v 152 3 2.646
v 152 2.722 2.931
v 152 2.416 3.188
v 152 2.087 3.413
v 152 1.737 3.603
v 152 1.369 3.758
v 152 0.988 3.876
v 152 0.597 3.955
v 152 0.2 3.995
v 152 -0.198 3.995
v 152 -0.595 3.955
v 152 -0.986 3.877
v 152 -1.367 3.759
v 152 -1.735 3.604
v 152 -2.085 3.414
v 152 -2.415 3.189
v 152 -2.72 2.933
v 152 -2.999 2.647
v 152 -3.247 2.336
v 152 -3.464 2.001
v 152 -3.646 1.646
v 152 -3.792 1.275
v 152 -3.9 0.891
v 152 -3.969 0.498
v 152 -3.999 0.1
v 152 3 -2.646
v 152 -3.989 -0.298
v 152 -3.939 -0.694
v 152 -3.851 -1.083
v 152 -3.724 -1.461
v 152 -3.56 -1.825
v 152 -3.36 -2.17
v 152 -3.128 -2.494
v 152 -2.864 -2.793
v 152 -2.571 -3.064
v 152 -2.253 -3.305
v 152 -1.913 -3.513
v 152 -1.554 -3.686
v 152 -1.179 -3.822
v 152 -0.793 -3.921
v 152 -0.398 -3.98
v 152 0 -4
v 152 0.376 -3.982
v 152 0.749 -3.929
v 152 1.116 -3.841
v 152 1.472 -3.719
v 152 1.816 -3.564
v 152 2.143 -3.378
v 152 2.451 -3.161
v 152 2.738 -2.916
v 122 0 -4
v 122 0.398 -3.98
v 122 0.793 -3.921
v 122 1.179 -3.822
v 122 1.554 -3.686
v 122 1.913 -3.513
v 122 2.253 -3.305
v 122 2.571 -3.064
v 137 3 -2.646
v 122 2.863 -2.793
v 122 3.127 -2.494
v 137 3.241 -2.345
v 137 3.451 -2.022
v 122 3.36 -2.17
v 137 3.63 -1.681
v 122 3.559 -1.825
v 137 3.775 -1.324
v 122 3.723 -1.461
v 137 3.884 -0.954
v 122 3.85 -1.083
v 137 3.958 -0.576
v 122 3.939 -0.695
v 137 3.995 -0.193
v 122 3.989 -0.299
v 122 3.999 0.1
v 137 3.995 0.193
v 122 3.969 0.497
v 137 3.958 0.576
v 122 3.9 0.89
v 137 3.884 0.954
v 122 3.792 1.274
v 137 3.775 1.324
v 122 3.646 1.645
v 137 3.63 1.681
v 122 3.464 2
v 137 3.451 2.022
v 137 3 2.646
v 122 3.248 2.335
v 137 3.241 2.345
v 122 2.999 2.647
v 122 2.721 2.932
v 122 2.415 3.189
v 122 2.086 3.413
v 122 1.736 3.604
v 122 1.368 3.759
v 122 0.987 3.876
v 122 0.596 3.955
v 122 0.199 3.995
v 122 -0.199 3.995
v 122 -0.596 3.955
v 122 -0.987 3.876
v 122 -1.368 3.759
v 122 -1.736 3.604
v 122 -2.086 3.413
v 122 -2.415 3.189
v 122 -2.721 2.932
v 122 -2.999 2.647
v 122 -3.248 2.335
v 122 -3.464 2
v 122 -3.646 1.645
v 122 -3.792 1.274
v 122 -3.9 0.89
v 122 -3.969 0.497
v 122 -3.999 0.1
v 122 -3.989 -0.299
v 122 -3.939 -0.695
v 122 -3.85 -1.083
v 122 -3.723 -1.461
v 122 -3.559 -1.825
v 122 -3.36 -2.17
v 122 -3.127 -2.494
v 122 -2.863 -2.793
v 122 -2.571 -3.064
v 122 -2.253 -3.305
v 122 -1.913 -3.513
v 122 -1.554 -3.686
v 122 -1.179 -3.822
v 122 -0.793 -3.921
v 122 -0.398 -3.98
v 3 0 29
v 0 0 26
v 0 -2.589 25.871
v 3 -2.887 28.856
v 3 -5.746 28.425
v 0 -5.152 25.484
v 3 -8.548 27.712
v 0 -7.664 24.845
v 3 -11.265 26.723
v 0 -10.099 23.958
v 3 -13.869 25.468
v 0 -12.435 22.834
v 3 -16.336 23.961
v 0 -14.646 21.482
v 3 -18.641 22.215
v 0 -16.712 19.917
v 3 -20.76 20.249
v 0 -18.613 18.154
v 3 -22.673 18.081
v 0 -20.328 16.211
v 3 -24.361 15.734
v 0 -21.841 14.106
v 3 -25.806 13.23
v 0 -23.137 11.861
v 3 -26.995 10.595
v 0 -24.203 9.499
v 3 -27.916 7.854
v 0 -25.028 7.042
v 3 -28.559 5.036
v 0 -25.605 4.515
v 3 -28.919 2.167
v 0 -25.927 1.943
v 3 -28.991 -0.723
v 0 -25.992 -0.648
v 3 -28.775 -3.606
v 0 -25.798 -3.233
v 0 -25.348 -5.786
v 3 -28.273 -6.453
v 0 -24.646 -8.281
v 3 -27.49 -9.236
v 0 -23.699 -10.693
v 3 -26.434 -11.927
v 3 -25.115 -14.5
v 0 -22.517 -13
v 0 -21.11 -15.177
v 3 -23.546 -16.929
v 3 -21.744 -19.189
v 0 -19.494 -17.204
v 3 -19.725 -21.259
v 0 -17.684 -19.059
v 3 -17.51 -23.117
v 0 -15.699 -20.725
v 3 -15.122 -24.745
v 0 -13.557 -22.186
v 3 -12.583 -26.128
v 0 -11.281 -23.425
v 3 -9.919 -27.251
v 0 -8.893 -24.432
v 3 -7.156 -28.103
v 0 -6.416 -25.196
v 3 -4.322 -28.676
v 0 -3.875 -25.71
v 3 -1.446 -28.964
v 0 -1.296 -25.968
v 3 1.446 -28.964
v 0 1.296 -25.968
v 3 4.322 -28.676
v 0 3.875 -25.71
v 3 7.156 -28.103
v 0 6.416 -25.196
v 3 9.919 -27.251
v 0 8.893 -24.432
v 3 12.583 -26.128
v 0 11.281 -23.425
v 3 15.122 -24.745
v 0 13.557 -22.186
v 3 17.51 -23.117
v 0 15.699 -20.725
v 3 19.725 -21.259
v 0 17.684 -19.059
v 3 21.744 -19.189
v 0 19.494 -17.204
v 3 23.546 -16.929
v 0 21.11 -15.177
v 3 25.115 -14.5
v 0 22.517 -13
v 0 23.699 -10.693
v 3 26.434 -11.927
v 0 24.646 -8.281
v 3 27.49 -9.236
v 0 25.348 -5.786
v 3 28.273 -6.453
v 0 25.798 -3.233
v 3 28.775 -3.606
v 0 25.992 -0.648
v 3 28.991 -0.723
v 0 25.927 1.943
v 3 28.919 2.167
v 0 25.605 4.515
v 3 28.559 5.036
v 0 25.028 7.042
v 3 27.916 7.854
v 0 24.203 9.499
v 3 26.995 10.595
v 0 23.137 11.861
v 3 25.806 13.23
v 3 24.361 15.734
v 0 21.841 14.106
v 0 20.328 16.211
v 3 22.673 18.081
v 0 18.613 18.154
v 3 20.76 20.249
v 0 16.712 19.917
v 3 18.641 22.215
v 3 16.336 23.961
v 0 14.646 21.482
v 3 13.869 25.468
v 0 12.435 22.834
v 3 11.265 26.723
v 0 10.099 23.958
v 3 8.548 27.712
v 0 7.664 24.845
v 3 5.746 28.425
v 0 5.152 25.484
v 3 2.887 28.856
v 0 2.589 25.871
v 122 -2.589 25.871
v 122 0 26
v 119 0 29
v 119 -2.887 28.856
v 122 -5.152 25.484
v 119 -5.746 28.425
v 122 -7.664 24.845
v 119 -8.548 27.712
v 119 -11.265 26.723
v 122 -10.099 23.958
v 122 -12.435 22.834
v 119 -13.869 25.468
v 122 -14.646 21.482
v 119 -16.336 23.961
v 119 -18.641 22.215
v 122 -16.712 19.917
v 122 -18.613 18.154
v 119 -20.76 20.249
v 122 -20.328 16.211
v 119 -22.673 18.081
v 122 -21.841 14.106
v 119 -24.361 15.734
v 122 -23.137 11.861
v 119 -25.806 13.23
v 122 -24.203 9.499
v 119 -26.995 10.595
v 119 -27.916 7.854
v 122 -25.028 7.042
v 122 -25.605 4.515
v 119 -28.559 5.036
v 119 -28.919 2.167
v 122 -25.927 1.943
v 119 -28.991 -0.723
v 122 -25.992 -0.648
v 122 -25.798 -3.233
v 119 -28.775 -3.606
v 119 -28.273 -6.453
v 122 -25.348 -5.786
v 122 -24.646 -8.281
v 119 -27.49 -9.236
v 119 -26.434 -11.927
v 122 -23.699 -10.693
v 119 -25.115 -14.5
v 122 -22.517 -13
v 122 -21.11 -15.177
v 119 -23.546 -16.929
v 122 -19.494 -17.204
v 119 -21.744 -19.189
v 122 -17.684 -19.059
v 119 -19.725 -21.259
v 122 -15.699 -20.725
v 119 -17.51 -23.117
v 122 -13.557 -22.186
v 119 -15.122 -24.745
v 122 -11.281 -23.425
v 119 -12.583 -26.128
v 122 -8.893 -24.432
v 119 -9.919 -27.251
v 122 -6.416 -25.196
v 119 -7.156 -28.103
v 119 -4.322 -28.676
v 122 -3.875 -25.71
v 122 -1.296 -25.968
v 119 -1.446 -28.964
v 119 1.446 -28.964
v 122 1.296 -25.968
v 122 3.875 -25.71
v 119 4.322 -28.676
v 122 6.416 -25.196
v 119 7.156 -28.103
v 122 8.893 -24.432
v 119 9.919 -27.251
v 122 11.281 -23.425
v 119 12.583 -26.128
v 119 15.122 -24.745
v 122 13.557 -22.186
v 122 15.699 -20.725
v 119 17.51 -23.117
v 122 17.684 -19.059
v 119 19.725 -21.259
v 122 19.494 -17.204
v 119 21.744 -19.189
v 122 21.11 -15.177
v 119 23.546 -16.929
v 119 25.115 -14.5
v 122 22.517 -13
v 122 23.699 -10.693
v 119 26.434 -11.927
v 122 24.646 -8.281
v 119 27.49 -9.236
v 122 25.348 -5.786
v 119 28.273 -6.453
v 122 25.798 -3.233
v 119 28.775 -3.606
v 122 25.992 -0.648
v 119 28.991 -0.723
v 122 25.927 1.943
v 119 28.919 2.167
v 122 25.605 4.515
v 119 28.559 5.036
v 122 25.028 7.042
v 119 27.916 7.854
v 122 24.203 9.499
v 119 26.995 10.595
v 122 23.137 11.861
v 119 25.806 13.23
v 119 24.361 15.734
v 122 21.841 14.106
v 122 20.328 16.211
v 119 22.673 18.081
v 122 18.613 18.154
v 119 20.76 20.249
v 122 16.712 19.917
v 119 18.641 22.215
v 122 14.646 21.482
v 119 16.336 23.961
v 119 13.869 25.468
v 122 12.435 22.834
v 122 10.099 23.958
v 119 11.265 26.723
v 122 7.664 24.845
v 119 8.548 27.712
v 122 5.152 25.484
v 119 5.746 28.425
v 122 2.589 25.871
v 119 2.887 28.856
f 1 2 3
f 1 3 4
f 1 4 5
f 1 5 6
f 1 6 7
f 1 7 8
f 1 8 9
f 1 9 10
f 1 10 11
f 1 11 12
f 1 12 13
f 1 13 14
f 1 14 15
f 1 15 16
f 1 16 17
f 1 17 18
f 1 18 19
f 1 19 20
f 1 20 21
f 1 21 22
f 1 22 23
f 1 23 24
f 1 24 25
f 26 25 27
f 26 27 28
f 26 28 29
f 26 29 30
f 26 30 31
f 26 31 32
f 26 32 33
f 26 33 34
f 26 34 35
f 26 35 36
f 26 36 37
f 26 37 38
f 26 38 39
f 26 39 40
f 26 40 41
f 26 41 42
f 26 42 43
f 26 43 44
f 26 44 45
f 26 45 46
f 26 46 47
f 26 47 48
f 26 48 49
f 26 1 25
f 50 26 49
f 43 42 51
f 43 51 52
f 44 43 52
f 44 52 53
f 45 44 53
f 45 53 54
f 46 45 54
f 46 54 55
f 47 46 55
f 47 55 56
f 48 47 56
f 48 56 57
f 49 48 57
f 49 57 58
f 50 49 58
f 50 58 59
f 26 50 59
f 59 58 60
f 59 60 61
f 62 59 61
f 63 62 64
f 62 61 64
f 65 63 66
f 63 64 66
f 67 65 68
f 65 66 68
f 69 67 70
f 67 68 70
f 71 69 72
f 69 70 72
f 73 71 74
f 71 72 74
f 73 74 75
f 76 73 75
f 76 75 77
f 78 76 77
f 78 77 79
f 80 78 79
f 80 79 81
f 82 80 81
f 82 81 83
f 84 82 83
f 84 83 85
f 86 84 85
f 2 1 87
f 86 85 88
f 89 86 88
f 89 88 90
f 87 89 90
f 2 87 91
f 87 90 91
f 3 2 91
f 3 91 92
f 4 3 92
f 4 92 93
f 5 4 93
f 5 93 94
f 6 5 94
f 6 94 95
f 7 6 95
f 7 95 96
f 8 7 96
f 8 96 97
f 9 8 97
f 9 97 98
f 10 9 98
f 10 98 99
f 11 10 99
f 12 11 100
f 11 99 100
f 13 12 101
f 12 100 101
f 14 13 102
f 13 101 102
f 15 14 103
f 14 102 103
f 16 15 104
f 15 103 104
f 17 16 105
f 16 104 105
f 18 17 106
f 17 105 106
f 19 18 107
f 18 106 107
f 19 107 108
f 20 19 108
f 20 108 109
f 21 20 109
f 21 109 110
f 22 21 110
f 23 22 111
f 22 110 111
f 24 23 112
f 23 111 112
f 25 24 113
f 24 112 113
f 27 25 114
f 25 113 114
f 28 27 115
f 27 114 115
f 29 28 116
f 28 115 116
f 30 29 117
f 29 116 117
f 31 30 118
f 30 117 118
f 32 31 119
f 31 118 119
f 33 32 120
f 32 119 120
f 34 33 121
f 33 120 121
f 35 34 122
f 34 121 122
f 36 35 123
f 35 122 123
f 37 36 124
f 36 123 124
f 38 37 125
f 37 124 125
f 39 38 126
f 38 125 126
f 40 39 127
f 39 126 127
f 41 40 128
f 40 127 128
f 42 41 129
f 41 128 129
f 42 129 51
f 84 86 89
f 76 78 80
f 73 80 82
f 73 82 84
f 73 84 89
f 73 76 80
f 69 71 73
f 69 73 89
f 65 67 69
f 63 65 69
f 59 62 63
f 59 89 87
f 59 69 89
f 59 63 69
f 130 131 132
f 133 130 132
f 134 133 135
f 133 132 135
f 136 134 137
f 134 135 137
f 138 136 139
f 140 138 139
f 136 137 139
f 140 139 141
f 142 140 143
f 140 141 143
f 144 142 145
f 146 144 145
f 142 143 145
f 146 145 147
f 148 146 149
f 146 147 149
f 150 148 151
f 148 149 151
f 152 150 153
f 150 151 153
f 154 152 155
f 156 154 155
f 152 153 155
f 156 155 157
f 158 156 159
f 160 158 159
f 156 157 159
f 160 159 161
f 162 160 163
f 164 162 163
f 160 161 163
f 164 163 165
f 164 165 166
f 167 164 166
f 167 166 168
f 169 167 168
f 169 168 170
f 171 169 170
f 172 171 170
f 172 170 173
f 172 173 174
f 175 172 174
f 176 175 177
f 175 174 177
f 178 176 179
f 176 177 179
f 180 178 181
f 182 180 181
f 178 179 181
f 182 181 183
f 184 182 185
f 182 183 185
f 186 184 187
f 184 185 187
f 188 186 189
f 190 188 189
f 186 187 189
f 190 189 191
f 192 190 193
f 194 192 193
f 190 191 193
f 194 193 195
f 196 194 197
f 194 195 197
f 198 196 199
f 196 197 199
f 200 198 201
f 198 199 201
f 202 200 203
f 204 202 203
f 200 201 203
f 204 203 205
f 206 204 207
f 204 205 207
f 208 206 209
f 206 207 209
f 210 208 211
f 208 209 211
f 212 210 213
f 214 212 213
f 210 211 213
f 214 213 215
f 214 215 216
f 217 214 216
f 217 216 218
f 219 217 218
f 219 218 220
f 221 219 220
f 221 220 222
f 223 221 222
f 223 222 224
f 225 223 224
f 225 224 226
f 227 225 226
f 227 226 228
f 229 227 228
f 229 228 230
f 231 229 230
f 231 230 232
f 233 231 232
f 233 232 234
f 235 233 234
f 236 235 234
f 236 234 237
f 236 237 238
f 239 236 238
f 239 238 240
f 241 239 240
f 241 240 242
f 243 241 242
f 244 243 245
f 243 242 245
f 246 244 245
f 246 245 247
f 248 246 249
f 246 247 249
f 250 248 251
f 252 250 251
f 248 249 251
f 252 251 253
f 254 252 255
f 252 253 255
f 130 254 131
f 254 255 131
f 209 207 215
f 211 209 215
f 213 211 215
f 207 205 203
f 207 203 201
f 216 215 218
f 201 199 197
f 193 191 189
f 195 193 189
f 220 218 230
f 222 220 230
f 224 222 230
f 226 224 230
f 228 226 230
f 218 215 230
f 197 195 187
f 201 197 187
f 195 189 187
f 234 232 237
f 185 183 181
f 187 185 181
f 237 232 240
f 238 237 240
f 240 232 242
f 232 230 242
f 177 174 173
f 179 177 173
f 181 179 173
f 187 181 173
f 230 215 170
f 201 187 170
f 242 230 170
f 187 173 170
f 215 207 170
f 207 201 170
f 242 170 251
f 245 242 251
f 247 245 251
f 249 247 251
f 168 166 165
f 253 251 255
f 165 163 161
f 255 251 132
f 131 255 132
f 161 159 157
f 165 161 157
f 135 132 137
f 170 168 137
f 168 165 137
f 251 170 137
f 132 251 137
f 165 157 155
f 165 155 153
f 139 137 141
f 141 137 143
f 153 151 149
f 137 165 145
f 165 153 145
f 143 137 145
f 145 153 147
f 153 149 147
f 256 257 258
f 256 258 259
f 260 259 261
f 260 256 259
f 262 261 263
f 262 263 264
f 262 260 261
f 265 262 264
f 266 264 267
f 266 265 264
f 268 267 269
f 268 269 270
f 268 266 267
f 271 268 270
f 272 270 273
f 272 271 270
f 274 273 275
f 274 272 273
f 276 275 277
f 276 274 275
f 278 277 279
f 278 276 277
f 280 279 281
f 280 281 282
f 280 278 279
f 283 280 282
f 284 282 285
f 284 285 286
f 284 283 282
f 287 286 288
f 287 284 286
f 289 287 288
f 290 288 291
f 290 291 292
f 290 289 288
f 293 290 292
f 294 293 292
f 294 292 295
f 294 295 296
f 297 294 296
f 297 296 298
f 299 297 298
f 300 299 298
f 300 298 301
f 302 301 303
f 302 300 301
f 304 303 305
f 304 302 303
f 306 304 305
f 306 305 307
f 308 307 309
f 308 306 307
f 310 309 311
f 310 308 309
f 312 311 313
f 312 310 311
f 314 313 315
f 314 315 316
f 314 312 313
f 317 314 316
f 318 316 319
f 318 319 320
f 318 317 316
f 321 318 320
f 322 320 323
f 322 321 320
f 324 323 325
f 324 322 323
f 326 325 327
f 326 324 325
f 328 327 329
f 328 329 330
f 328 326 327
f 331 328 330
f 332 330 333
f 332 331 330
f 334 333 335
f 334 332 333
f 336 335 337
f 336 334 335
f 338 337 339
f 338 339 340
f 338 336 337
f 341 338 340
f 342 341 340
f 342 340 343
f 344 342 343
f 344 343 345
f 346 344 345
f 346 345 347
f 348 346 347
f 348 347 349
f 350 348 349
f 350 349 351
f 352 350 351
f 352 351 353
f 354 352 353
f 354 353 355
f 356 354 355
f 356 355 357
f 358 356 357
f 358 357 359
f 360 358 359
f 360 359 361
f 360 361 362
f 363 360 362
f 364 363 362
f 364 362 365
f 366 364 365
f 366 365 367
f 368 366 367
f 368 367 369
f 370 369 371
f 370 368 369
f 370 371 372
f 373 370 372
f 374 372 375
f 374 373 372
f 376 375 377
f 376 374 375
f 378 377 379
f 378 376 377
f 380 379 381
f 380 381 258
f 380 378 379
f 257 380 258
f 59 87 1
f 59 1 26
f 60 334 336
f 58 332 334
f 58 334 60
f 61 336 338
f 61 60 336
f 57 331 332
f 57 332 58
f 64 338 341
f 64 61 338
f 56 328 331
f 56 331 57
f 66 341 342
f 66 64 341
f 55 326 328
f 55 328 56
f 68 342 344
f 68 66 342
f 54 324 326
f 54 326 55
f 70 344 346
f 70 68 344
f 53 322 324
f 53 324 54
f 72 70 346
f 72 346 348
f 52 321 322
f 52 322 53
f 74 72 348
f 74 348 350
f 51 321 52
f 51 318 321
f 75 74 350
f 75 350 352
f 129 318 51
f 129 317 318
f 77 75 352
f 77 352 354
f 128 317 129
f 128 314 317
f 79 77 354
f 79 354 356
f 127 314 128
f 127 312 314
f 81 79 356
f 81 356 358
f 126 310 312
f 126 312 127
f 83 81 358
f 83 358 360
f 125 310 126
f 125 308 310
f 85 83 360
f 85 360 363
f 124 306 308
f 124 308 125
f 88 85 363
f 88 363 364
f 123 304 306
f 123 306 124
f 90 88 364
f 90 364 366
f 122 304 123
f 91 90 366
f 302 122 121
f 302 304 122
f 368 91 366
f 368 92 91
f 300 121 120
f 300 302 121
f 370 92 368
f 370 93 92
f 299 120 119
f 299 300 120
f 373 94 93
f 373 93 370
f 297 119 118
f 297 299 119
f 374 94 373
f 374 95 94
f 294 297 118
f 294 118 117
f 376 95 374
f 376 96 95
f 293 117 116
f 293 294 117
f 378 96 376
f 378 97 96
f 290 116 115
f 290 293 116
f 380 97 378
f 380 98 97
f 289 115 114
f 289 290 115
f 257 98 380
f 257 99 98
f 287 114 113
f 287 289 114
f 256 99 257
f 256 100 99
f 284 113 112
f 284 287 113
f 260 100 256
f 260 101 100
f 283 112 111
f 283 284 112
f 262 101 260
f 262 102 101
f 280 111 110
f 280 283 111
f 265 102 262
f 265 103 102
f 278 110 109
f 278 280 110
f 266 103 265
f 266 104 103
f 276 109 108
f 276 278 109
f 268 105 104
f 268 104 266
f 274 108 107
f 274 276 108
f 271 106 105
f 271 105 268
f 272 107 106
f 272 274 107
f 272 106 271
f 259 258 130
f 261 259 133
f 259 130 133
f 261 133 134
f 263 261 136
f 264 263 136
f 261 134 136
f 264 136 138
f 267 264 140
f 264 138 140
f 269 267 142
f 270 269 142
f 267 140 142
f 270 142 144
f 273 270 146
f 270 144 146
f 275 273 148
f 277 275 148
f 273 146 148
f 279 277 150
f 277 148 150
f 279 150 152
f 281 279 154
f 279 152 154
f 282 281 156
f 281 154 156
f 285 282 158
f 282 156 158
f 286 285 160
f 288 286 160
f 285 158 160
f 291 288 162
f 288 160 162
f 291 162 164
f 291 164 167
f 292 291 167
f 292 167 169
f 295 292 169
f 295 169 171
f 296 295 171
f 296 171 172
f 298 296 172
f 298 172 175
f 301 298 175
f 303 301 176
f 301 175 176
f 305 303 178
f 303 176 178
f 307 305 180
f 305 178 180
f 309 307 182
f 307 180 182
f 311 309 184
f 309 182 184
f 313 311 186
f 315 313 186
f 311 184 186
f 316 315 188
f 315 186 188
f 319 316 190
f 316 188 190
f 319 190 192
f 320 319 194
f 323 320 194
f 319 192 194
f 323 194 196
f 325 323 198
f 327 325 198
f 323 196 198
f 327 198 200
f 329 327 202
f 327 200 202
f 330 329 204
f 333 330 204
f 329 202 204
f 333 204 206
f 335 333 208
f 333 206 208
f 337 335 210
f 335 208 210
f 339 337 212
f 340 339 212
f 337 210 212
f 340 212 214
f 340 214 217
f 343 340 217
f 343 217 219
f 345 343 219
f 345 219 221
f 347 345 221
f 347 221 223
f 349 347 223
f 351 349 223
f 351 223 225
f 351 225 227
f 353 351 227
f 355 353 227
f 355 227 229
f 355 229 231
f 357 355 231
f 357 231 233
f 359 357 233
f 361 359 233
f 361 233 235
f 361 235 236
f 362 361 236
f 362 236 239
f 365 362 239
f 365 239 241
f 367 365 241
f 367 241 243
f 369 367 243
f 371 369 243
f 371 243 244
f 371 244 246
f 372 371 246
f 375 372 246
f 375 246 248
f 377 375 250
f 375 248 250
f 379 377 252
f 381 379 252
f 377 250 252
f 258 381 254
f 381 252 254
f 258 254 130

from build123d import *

# Parameters (mm, degrees)
SKETCH_1_R          = 29
EXTRUDE_1_DEPTH     = 122
CHAMFER_1_SIZE      = 3
SKETCH_2_R          = 4
EXTRUDE_2_DEPTH     = 30
CUT_EXTRUDE_START   = -15
CUT_EXTRUDE_1_DEPTH = 15


with BuildPart() as part:
    # Эскиз1 → Бобышка-Вытянуть1 (new body)
    with BuildSketch(Plane(origin=(0, 0, 0), x_dir=(0, 0, -1), z_dir=(1, 0, 0))):
        with Locations(Location((0, 0, 0), (0, 0, 180))):
            Circle(SKETCH_1_R)
    extrude(amount=EXTRUDE_1_DEPTH)

    # Фаска1
    chamfer_1_edges = [part.edges().sort_by_distance(p)[0] for p in [
        (0, 0, -29),
        (122, 0, -29),
    ]]
    chamfer(chamfer_1_edges, length=CHAMFER_1_SIZE)

    # Эскиз2 → Бобышка-Вытянуть2 (add)
    with BuildSketch(Plane(origin=(122, 0, 0), x_dir=(0, 0, -1), z_dir=(1, 0, 0))):
        Circle(SKETCH_2_R)
    extrude(amount=EXTRUDE_2_DEPTH)

    # Эскиз3 → Вырез-Вытянуть1 (cut)
    with BuildSketch(Plane(origin=(152, 0, 0), x_dir=(0, 0, -1), z_dir=(1, 0, 0)).offset(CUT_EXTRUDE_START)):
        with BuildLine():
            Line((-2.645751311, 3), (2.645751311, 3))
            ThreePointArc((2.645751311, 3), (0, 4), (-2.645751311, 3))
        make_face()
    extrude(amount=CUT_EXTRUDE_1_DEPTH, mode=Mode.SUBTRACT)


solid = part.part
